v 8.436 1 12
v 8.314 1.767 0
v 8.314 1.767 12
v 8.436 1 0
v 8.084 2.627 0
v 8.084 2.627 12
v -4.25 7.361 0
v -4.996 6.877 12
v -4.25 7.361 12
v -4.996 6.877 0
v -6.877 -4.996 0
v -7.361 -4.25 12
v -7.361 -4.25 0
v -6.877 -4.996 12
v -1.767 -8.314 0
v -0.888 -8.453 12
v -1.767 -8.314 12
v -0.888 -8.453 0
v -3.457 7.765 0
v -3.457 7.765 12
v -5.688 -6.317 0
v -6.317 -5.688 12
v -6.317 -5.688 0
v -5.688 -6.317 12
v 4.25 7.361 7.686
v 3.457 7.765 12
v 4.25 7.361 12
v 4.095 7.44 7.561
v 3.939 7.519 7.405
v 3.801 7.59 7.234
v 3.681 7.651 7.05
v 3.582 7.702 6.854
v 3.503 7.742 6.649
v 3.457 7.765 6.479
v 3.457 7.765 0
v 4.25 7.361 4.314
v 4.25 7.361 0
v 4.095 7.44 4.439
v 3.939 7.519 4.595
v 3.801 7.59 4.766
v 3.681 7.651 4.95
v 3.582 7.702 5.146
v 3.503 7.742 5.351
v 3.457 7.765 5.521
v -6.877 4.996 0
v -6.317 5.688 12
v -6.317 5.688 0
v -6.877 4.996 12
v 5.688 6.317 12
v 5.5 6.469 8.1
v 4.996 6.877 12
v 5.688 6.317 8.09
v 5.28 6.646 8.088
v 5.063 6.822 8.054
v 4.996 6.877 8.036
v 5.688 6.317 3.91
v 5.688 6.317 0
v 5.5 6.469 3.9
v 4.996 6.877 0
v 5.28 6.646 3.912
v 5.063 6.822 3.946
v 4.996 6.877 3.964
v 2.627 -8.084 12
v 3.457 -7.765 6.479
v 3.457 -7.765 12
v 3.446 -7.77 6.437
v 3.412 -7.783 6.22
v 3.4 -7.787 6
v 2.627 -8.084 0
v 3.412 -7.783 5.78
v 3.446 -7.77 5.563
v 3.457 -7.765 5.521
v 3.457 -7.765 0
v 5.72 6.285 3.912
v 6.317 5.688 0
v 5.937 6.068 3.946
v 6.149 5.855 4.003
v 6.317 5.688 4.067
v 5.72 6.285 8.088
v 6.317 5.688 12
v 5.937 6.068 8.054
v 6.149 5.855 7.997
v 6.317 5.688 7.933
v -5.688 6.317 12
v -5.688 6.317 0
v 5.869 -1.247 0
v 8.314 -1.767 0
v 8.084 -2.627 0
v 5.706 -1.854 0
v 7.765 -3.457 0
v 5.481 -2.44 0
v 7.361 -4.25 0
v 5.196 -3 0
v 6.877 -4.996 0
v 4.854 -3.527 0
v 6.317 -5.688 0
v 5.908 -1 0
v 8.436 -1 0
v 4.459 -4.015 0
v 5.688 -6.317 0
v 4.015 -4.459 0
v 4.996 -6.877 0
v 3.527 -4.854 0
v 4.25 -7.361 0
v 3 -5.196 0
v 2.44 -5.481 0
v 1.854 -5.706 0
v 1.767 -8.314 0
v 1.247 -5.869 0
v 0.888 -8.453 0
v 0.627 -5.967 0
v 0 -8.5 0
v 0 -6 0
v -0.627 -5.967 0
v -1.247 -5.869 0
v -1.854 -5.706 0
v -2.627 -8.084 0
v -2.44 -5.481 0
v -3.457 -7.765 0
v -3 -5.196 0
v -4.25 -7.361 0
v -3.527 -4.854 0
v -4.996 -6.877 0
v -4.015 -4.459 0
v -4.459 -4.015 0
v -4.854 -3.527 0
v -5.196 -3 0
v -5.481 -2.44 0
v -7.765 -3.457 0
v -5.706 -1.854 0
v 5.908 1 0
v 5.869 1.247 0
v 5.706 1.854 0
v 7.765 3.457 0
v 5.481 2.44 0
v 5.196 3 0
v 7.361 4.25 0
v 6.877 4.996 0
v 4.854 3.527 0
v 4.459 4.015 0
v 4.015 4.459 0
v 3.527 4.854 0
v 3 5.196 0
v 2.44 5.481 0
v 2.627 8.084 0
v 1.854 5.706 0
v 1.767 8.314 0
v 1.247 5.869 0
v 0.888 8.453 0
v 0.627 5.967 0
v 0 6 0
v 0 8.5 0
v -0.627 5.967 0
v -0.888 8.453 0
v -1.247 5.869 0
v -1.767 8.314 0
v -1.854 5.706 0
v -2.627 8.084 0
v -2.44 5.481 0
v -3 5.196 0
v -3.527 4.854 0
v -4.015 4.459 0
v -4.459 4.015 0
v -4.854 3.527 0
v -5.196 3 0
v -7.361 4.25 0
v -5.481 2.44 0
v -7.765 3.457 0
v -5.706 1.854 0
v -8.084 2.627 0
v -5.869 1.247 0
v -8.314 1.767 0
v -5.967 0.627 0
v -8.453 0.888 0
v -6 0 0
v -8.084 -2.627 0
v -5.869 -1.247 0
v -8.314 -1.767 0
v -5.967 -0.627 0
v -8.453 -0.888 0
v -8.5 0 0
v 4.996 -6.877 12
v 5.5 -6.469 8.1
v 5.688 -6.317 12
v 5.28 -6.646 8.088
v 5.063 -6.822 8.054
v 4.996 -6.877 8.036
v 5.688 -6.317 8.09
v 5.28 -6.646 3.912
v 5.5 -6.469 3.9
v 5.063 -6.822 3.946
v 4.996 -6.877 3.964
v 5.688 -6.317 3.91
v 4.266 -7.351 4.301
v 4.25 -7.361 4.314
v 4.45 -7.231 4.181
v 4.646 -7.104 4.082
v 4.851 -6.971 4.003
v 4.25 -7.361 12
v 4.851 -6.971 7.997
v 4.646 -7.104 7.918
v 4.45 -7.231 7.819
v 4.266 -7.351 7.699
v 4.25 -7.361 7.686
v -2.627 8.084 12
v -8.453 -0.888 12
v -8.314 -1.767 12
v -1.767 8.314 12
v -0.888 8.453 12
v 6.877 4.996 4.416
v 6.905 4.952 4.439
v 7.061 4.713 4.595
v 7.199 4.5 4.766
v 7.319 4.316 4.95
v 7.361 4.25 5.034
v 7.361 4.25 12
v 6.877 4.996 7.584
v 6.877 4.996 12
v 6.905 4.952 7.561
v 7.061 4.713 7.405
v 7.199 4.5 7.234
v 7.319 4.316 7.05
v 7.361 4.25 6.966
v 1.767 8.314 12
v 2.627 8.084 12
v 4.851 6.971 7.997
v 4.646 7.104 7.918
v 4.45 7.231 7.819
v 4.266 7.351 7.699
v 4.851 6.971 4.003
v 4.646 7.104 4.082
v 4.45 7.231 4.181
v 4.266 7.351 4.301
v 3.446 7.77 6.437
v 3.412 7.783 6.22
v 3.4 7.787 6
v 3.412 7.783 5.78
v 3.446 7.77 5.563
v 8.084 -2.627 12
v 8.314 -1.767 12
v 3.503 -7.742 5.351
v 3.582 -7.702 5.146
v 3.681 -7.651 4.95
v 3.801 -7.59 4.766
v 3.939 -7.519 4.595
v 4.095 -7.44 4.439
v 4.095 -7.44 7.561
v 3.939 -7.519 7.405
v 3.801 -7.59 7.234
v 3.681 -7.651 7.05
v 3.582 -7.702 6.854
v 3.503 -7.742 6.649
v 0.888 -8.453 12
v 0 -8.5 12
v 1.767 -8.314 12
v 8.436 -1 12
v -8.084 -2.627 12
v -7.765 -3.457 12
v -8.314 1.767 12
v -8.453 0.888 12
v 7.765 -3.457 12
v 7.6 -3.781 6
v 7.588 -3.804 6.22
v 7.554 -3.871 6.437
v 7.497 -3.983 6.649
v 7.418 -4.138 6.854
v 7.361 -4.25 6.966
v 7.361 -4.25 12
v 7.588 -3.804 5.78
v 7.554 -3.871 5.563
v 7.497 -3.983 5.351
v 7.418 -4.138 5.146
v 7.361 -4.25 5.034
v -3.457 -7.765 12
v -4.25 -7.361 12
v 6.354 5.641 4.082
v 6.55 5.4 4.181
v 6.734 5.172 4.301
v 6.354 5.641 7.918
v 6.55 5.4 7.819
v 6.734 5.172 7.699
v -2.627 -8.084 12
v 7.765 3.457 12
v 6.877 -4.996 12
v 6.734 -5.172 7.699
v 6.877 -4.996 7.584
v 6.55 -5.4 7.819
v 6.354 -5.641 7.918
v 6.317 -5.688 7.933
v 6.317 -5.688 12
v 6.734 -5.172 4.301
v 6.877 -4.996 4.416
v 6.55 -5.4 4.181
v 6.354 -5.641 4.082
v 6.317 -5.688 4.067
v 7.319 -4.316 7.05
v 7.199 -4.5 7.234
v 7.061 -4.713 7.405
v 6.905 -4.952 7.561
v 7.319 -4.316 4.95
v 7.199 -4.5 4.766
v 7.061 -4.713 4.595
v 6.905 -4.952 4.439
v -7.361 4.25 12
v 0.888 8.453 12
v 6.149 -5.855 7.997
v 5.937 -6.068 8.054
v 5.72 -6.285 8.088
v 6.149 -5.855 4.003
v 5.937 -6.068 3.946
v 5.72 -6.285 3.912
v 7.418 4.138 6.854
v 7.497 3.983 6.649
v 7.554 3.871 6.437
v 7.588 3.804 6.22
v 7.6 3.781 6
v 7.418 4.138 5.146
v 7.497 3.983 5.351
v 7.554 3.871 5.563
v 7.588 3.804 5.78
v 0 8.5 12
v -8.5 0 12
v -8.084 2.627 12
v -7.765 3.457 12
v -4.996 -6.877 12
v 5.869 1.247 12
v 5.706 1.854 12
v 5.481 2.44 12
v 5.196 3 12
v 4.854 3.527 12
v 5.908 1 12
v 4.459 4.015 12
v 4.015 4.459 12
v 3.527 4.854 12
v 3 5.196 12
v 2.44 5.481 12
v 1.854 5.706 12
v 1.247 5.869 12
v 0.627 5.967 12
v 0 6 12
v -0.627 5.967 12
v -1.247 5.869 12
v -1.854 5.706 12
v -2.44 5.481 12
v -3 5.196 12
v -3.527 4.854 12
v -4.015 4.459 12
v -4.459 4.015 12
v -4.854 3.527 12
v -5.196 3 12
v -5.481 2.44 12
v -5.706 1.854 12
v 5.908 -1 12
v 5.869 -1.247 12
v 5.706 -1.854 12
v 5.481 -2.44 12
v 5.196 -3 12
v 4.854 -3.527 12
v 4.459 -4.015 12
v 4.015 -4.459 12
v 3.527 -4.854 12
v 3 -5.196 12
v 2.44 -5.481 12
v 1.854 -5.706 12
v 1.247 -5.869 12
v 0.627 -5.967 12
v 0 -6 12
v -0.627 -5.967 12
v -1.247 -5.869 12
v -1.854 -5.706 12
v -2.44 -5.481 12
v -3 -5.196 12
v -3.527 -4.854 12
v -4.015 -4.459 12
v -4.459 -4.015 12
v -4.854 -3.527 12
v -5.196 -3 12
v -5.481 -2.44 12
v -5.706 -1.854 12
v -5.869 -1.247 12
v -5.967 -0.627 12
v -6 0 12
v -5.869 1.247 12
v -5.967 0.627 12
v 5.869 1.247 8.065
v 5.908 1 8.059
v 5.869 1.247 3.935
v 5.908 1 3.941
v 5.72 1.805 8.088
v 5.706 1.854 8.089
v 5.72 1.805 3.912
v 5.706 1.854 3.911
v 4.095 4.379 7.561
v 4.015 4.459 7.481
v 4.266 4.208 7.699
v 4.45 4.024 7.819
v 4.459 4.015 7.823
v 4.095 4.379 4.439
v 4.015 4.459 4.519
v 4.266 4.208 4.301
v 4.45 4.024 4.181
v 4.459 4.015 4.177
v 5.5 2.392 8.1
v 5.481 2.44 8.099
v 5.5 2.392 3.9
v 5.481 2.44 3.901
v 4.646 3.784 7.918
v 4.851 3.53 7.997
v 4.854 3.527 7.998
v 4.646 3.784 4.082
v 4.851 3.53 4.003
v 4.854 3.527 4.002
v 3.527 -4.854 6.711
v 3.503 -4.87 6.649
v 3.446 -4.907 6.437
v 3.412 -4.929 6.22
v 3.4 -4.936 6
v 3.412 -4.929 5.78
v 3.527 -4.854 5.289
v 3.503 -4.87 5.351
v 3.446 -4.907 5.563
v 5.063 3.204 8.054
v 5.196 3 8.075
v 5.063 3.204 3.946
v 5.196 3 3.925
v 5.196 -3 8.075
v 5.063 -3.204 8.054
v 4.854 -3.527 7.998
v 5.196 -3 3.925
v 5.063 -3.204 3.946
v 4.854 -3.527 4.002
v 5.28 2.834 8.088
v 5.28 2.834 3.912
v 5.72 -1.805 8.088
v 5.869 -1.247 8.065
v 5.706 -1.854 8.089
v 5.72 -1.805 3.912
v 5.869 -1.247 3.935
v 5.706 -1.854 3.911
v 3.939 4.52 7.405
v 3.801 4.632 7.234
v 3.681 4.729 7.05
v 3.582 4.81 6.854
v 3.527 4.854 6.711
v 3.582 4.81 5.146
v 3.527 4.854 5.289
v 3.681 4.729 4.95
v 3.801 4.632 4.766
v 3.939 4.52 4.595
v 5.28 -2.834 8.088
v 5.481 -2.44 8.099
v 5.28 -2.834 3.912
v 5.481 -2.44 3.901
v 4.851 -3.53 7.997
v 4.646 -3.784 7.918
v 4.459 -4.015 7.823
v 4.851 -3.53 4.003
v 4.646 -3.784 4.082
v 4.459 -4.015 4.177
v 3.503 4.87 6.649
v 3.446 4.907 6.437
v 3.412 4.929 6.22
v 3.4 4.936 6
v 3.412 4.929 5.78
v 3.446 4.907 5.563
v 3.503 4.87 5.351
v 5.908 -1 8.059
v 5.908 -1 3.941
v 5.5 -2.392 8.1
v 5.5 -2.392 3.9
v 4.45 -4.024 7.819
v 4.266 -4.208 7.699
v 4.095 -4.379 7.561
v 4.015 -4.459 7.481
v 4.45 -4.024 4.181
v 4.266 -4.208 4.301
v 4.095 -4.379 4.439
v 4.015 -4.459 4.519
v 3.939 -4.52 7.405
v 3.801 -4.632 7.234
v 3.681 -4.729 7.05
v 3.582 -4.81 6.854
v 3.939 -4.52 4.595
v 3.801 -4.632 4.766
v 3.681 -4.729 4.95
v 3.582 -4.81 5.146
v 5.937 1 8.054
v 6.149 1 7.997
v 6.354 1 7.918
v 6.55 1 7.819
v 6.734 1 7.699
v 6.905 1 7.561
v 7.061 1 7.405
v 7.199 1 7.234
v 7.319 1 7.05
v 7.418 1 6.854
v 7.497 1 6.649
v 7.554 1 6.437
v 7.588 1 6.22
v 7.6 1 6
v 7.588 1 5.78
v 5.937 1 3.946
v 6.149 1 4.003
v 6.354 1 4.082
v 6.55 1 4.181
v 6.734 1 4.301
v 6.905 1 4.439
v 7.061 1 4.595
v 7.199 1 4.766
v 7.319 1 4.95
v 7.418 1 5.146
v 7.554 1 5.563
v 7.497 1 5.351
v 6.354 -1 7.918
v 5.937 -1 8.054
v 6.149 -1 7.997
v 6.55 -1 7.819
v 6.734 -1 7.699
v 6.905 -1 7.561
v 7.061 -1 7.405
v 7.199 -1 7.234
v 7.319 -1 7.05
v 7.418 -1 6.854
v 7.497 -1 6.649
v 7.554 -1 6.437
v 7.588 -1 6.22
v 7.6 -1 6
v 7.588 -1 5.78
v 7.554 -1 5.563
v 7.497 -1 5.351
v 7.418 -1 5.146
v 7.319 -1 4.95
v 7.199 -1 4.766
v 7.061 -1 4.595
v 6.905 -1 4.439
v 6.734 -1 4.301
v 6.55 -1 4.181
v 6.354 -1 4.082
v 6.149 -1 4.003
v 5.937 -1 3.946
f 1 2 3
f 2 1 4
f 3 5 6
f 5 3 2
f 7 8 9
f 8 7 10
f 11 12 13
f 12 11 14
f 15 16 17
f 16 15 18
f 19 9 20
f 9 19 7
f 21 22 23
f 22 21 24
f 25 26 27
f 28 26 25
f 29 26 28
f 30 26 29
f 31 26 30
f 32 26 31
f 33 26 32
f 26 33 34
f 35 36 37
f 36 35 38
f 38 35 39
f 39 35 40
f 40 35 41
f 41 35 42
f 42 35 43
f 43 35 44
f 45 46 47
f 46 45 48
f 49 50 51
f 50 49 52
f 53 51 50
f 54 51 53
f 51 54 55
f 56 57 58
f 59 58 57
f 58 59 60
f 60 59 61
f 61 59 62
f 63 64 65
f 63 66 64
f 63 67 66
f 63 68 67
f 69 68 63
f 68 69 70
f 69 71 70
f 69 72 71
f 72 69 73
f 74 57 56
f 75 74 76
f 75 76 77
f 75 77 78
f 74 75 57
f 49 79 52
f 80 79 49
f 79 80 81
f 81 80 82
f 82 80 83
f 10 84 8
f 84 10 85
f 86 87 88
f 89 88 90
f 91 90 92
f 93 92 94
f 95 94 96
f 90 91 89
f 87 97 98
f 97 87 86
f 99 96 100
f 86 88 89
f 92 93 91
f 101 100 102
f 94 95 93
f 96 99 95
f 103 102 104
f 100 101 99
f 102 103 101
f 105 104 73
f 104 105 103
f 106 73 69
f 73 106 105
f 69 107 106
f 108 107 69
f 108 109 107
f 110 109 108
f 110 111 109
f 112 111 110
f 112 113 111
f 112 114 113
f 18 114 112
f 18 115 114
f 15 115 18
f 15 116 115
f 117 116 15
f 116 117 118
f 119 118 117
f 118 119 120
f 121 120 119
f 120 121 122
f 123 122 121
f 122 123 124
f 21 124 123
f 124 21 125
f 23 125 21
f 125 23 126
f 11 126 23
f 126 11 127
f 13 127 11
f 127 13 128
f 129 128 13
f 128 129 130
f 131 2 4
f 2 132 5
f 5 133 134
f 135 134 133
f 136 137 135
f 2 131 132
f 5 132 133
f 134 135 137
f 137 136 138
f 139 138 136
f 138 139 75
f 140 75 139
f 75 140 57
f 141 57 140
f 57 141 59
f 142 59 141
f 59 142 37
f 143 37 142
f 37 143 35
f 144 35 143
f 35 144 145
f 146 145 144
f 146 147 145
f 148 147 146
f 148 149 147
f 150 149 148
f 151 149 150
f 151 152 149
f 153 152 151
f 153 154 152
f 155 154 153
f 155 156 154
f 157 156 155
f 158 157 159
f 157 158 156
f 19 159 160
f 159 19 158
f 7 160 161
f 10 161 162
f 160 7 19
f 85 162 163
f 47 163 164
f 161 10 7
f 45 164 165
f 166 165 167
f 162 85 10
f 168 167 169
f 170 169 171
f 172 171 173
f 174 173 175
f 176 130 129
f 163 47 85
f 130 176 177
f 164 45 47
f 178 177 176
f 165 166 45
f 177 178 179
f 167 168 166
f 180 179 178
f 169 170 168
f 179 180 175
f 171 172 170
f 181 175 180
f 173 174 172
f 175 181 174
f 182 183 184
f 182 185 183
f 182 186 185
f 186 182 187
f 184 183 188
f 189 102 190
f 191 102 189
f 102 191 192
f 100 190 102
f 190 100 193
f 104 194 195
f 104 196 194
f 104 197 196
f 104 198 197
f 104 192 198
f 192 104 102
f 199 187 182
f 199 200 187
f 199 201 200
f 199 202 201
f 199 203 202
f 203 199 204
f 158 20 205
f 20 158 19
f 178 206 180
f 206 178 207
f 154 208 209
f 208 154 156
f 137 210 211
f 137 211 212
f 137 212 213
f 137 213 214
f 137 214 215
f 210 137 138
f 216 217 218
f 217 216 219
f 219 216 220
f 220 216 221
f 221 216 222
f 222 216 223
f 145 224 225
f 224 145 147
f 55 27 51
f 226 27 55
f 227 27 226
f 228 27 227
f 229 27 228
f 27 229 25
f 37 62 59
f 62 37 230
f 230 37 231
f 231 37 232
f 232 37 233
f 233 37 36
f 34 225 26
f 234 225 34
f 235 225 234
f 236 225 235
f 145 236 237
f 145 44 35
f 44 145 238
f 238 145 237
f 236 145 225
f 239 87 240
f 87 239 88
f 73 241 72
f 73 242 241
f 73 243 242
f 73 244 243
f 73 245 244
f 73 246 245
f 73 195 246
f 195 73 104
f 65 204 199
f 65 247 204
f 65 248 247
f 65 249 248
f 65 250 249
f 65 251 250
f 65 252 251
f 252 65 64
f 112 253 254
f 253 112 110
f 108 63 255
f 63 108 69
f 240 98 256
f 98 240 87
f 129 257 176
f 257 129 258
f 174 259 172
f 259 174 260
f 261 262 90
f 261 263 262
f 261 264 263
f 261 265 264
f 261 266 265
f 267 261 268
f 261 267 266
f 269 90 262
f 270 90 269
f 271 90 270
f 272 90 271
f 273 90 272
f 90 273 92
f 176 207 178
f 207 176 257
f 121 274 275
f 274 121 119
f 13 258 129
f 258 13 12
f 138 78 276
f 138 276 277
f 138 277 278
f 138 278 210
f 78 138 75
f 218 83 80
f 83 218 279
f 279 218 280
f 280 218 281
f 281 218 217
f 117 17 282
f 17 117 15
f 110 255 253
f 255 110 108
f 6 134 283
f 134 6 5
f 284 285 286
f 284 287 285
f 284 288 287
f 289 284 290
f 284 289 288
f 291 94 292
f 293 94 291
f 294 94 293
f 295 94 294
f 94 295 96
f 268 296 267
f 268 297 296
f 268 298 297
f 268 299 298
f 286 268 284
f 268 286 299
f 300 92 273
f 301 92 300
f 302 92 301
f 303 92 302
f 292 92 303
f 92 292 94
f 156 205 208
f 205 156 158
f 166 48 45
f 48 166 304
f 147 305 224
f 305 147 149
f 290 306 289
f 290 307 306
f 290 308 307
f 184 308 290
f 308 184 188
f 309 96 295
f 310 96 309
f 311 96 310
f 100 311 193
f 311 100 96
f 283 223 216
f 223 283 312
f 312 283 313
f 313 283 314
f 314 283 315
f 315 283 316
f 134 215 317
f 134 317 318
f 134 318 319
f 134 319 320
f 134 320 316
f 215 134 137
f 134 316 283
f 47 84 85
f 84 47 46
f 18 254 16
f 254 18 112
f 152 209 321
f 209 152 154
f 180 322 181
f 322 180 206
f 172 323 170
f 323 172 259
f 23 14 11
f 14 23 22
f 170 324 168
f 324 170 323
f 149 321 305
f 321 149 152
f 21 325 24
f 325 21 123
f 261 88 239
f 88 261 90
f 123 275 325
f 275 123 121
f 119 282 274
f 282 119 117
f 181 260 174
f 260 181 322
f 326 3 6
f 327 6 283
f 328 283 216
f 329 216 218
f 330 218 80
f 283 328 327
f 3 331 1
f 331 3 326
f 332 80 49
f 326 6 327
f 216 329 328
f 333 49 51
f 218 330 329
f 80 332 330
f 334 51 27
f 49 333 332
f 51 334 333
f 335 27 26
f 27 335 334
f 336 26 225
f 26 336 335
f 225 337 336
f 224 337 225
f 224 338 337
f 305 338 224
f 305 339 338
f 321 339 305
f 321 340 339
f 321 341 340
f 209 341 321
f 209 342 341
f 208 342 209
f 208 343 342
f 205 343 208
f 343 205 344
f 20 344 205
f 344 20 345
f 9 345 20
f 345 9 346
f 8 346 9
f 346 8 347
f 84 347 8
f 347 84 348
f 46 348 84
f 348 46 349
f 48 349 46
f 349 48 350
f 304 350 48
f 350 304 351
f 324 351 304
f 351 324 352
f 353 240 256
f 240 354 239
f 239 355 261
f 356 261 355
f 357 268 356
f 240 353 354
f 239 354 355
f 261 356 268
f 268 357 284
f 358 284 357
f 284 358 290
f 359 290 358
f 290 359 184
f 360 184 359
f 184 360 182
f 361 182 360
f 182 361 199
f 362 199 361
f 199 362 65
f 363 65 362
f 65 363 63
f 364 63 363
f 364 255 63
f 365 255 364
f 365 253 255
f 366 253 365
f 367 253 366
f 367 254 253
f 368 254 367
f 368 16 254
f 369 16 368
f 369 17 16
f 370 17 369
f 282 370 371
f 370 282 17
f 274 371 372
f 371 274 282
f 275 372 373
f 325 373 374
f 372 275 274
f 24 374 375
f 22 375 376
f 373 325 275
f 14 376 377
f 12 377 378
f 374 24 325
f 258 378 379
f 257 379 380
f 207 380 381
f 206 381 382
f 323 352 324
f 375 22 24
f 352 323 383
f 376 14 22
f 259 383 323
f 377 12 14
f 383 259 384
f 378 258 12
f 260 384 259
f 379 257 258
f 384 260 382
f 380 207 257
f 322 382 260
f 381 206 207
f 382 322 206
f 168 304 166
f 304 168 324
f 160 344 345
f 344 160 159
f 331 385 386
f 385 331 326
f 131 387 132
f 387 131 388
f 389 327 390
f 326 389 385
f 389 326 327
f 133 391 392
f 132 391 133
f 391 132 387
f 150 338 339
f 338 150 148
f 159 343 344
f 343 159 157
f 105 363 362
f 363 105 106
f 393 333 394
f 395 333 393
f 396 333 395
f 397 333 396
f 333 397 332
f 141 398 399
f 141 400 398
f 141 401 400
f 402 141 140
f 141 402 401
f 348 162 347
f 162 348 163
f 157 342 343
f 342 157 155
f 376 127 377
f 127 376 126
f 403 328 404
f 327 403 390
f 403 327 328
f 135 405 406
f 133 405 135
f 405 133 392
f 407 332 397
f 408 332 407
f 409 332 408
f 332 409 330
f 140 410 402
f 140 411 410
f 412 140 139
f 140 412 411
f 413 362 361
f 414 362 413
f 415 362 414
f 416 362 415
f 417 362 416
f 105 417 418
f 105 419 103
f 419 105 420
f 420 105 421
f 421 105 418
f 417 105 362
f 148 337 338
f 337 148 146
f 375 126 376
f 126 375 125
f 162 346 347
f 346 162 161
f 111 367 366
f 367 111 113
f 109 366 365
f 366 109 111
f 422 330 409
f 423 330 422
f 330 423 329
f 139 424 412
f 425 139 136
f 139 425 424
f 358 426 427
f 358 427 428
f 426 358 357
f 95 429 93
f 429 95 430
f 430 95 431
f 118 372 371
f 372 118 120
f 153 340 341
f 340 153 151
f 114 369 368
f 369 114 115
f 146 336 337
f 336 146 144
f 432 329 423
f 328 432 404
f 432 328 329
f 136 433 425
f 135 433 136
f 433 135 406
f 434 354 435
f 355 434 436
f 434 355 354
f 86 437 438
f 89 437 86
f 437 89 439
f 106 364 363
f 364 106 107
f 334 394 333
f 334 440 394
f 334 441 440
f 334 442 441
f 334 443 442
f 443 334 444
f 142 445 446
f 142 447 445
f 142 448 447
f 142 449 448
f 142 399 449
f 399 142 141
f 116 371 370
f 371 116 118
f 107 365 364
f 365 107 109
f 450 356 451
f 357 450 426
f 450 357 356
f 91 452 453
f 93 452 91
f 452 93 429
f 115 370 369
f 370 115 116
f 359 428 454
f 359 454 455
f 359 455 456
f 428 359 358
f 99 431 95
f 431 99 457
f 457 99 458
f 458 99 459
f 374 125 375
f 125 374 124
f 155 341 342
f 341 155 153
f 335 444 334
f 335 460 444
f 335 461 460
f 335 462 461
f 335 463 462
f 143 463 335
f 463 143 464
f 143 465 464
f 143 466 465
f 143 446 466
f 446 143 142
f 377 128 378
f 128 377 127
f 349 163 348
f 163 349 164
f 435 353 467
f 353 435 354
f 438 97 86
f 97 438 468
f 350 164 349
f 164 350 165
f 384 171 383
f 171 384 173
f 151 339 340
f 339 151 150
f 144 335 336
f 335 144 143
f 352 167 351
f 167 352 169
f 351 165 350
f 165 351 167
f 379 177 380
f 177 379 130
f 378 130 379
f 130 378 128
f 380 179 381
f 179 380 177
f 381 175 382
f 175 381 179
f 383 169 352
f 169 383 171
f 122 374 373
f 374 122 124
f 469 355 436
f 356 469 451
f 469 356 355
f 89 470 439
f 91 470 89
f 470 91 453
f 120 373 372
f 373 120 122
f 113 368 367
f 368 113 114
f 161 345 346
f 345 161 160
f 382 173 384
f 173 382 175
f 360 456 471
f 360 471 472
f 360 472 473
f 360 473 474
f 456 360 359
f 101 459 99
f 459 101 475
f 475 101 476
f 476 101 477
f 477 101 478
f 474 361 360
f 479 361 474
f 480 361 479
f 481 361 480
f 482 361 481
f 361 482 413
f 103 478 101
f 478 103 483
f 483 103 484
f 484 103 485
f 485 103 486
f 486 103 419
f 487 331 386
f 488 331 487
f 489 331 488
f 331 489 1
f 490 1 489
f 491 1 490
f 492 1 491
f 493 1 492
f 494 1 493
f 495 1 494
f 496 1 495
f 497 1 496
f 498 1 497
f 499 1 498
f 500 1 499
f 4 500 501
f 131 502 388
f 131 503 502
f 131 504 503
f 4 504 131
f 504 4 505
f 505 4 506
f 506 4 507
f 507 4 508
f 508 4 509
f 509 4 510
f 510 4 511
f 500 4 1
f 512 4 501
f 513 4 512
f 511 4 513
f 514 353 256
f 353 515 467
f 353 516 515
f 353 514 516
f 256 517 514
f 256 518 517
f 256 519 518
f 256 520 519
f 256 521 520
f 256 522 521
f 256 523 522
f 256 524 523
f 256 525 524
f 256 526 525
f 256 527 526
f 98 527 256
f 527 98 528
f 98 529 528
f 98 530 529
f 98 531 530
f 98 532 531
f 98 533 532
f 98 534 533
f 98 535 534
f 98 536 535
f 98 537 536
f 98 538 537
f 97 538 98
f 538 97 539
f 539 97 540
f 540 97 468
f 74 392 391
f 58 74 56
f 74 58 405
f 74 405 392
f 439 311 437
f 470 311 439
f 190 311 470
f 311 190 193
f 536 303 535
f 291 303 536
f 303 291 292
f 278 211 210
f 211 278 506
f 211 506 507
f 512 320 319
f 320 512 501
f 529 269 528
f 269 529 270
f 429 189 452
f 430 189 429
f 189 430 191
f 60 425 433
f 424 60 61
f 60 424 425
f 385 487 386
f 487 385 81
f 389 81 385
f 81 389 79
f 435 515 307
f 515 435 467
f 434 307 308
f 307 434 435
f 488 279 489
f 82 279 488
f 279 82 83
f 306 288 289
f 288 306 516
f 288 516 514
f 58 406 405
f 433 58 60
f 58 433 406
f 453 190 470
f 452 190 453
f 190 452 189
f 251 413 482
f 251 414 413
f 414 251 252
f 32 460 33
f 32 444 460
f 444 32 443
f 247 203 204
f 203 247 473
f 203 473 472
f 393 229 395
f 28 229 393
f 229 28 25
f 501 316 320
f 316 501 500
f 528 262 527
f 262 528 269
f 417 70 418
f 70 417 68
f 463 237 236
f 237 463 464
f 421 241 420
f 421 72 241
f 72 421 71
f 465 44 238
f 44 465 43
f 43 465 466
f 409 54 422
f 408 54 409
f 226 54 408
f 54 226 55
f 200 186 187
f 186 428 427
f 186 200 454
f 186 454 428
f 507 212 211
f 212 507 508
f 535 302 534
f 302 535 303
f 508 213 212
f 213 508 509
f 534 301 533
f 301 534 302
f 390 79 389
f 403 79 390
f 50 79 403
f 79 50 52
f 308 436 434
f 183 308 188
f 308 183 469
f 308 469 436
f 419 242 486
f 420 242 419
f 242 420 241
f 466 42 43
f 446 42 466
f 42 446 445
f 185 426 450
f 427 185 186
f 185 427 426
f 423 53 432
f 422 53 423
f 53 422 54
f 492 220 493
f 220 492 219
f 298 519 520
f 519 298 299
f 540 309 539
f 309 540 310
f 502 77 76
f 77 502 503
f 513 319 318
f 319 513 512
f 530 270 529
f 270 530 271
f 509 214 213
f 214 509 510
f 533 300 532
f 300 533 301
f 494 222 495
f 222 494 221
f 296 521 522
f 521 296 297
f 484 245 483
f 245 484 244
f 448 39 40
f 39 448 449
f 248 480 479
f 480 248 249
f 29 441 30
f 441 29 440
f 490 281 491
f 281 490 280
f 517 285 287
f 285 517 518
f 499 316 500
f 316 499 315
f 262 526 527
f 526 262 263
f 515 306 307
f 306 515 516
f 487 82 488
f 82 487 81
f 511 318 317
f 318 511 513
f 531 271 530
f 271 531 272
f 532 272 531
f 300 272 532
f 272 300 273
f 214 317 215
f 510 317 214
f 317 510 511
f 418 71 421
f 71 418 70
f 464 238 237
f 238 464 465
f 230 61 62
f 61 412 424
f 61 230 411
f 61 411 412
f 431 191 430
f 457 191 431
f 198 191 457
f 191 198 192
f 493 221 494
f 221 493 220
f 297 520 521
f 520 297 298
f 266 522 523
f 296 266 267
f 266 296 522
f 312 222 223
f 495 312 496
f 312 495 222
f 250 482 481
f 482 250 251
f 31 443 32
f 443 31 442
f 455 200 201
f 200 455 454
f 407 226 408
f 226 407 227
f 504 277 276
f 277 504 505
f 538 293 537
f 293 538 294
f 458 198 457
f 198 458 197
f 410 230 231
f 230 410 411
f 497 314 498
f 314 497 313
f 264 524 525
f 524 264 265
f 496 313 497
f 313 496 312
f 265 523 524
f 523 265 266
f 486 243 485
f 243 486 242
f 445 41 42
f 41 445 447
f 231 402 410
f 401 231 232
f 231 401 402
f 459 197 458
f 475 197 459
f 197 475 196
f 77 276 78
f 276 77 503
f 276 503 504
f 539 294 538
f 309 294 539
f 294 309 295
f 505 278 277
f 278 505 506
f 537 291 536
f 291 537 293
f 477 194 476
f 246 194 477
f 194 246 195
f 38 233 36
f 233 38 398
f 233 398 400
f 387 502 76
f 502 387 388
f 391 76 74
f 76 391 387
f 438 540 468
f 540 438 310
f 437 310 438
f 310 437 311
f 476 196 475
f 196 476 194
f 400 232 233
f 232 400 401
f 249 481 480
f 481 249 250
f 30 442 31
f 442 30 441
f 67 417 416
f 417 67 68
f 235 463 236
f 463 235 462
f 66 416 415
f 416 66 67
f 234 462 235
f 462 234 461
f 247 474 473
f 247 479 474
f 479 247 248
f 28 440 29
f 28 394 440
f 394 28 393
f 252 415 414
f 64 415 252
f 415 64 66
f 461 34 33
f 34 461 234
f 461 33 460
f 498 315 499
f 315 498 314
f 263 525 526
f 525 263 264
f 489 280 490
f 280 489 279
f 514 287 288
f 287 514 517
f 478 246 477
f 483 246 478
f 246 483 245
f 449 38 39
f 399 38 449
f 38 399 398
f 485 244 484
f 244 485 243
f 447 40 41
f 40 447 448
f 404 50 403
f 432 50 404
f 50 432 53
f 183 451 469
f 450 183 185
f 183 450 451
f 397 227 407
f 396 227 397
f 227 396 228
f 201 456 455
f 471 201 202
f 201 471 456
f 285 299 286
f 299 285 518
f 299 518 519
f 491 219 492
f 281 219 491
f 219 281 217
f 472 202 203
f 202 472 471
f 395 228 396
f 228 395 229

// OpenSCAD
// C-style pipe clamp.
$fn = 60;
eps = 0.02;
pipe_d = 12;
wall = 2.5;
outer_d = pipe_d+2*wall;
width = 12;
difference() {
    cylinder(d=outer_d,h=width);
    translate([0,0,-eps]) cylinder(d=pipe_d,h=width+2*eps);
    translate([0,-1,-eps]) cube([outer_d/2+eps,2,width+2*eps]);
    translate([outer_d/2-3,-outer_d/2-eps,width/2]) rotate([-90,0,0]) cylinder(d=4.2,h=outer_d+2*eps);
}
